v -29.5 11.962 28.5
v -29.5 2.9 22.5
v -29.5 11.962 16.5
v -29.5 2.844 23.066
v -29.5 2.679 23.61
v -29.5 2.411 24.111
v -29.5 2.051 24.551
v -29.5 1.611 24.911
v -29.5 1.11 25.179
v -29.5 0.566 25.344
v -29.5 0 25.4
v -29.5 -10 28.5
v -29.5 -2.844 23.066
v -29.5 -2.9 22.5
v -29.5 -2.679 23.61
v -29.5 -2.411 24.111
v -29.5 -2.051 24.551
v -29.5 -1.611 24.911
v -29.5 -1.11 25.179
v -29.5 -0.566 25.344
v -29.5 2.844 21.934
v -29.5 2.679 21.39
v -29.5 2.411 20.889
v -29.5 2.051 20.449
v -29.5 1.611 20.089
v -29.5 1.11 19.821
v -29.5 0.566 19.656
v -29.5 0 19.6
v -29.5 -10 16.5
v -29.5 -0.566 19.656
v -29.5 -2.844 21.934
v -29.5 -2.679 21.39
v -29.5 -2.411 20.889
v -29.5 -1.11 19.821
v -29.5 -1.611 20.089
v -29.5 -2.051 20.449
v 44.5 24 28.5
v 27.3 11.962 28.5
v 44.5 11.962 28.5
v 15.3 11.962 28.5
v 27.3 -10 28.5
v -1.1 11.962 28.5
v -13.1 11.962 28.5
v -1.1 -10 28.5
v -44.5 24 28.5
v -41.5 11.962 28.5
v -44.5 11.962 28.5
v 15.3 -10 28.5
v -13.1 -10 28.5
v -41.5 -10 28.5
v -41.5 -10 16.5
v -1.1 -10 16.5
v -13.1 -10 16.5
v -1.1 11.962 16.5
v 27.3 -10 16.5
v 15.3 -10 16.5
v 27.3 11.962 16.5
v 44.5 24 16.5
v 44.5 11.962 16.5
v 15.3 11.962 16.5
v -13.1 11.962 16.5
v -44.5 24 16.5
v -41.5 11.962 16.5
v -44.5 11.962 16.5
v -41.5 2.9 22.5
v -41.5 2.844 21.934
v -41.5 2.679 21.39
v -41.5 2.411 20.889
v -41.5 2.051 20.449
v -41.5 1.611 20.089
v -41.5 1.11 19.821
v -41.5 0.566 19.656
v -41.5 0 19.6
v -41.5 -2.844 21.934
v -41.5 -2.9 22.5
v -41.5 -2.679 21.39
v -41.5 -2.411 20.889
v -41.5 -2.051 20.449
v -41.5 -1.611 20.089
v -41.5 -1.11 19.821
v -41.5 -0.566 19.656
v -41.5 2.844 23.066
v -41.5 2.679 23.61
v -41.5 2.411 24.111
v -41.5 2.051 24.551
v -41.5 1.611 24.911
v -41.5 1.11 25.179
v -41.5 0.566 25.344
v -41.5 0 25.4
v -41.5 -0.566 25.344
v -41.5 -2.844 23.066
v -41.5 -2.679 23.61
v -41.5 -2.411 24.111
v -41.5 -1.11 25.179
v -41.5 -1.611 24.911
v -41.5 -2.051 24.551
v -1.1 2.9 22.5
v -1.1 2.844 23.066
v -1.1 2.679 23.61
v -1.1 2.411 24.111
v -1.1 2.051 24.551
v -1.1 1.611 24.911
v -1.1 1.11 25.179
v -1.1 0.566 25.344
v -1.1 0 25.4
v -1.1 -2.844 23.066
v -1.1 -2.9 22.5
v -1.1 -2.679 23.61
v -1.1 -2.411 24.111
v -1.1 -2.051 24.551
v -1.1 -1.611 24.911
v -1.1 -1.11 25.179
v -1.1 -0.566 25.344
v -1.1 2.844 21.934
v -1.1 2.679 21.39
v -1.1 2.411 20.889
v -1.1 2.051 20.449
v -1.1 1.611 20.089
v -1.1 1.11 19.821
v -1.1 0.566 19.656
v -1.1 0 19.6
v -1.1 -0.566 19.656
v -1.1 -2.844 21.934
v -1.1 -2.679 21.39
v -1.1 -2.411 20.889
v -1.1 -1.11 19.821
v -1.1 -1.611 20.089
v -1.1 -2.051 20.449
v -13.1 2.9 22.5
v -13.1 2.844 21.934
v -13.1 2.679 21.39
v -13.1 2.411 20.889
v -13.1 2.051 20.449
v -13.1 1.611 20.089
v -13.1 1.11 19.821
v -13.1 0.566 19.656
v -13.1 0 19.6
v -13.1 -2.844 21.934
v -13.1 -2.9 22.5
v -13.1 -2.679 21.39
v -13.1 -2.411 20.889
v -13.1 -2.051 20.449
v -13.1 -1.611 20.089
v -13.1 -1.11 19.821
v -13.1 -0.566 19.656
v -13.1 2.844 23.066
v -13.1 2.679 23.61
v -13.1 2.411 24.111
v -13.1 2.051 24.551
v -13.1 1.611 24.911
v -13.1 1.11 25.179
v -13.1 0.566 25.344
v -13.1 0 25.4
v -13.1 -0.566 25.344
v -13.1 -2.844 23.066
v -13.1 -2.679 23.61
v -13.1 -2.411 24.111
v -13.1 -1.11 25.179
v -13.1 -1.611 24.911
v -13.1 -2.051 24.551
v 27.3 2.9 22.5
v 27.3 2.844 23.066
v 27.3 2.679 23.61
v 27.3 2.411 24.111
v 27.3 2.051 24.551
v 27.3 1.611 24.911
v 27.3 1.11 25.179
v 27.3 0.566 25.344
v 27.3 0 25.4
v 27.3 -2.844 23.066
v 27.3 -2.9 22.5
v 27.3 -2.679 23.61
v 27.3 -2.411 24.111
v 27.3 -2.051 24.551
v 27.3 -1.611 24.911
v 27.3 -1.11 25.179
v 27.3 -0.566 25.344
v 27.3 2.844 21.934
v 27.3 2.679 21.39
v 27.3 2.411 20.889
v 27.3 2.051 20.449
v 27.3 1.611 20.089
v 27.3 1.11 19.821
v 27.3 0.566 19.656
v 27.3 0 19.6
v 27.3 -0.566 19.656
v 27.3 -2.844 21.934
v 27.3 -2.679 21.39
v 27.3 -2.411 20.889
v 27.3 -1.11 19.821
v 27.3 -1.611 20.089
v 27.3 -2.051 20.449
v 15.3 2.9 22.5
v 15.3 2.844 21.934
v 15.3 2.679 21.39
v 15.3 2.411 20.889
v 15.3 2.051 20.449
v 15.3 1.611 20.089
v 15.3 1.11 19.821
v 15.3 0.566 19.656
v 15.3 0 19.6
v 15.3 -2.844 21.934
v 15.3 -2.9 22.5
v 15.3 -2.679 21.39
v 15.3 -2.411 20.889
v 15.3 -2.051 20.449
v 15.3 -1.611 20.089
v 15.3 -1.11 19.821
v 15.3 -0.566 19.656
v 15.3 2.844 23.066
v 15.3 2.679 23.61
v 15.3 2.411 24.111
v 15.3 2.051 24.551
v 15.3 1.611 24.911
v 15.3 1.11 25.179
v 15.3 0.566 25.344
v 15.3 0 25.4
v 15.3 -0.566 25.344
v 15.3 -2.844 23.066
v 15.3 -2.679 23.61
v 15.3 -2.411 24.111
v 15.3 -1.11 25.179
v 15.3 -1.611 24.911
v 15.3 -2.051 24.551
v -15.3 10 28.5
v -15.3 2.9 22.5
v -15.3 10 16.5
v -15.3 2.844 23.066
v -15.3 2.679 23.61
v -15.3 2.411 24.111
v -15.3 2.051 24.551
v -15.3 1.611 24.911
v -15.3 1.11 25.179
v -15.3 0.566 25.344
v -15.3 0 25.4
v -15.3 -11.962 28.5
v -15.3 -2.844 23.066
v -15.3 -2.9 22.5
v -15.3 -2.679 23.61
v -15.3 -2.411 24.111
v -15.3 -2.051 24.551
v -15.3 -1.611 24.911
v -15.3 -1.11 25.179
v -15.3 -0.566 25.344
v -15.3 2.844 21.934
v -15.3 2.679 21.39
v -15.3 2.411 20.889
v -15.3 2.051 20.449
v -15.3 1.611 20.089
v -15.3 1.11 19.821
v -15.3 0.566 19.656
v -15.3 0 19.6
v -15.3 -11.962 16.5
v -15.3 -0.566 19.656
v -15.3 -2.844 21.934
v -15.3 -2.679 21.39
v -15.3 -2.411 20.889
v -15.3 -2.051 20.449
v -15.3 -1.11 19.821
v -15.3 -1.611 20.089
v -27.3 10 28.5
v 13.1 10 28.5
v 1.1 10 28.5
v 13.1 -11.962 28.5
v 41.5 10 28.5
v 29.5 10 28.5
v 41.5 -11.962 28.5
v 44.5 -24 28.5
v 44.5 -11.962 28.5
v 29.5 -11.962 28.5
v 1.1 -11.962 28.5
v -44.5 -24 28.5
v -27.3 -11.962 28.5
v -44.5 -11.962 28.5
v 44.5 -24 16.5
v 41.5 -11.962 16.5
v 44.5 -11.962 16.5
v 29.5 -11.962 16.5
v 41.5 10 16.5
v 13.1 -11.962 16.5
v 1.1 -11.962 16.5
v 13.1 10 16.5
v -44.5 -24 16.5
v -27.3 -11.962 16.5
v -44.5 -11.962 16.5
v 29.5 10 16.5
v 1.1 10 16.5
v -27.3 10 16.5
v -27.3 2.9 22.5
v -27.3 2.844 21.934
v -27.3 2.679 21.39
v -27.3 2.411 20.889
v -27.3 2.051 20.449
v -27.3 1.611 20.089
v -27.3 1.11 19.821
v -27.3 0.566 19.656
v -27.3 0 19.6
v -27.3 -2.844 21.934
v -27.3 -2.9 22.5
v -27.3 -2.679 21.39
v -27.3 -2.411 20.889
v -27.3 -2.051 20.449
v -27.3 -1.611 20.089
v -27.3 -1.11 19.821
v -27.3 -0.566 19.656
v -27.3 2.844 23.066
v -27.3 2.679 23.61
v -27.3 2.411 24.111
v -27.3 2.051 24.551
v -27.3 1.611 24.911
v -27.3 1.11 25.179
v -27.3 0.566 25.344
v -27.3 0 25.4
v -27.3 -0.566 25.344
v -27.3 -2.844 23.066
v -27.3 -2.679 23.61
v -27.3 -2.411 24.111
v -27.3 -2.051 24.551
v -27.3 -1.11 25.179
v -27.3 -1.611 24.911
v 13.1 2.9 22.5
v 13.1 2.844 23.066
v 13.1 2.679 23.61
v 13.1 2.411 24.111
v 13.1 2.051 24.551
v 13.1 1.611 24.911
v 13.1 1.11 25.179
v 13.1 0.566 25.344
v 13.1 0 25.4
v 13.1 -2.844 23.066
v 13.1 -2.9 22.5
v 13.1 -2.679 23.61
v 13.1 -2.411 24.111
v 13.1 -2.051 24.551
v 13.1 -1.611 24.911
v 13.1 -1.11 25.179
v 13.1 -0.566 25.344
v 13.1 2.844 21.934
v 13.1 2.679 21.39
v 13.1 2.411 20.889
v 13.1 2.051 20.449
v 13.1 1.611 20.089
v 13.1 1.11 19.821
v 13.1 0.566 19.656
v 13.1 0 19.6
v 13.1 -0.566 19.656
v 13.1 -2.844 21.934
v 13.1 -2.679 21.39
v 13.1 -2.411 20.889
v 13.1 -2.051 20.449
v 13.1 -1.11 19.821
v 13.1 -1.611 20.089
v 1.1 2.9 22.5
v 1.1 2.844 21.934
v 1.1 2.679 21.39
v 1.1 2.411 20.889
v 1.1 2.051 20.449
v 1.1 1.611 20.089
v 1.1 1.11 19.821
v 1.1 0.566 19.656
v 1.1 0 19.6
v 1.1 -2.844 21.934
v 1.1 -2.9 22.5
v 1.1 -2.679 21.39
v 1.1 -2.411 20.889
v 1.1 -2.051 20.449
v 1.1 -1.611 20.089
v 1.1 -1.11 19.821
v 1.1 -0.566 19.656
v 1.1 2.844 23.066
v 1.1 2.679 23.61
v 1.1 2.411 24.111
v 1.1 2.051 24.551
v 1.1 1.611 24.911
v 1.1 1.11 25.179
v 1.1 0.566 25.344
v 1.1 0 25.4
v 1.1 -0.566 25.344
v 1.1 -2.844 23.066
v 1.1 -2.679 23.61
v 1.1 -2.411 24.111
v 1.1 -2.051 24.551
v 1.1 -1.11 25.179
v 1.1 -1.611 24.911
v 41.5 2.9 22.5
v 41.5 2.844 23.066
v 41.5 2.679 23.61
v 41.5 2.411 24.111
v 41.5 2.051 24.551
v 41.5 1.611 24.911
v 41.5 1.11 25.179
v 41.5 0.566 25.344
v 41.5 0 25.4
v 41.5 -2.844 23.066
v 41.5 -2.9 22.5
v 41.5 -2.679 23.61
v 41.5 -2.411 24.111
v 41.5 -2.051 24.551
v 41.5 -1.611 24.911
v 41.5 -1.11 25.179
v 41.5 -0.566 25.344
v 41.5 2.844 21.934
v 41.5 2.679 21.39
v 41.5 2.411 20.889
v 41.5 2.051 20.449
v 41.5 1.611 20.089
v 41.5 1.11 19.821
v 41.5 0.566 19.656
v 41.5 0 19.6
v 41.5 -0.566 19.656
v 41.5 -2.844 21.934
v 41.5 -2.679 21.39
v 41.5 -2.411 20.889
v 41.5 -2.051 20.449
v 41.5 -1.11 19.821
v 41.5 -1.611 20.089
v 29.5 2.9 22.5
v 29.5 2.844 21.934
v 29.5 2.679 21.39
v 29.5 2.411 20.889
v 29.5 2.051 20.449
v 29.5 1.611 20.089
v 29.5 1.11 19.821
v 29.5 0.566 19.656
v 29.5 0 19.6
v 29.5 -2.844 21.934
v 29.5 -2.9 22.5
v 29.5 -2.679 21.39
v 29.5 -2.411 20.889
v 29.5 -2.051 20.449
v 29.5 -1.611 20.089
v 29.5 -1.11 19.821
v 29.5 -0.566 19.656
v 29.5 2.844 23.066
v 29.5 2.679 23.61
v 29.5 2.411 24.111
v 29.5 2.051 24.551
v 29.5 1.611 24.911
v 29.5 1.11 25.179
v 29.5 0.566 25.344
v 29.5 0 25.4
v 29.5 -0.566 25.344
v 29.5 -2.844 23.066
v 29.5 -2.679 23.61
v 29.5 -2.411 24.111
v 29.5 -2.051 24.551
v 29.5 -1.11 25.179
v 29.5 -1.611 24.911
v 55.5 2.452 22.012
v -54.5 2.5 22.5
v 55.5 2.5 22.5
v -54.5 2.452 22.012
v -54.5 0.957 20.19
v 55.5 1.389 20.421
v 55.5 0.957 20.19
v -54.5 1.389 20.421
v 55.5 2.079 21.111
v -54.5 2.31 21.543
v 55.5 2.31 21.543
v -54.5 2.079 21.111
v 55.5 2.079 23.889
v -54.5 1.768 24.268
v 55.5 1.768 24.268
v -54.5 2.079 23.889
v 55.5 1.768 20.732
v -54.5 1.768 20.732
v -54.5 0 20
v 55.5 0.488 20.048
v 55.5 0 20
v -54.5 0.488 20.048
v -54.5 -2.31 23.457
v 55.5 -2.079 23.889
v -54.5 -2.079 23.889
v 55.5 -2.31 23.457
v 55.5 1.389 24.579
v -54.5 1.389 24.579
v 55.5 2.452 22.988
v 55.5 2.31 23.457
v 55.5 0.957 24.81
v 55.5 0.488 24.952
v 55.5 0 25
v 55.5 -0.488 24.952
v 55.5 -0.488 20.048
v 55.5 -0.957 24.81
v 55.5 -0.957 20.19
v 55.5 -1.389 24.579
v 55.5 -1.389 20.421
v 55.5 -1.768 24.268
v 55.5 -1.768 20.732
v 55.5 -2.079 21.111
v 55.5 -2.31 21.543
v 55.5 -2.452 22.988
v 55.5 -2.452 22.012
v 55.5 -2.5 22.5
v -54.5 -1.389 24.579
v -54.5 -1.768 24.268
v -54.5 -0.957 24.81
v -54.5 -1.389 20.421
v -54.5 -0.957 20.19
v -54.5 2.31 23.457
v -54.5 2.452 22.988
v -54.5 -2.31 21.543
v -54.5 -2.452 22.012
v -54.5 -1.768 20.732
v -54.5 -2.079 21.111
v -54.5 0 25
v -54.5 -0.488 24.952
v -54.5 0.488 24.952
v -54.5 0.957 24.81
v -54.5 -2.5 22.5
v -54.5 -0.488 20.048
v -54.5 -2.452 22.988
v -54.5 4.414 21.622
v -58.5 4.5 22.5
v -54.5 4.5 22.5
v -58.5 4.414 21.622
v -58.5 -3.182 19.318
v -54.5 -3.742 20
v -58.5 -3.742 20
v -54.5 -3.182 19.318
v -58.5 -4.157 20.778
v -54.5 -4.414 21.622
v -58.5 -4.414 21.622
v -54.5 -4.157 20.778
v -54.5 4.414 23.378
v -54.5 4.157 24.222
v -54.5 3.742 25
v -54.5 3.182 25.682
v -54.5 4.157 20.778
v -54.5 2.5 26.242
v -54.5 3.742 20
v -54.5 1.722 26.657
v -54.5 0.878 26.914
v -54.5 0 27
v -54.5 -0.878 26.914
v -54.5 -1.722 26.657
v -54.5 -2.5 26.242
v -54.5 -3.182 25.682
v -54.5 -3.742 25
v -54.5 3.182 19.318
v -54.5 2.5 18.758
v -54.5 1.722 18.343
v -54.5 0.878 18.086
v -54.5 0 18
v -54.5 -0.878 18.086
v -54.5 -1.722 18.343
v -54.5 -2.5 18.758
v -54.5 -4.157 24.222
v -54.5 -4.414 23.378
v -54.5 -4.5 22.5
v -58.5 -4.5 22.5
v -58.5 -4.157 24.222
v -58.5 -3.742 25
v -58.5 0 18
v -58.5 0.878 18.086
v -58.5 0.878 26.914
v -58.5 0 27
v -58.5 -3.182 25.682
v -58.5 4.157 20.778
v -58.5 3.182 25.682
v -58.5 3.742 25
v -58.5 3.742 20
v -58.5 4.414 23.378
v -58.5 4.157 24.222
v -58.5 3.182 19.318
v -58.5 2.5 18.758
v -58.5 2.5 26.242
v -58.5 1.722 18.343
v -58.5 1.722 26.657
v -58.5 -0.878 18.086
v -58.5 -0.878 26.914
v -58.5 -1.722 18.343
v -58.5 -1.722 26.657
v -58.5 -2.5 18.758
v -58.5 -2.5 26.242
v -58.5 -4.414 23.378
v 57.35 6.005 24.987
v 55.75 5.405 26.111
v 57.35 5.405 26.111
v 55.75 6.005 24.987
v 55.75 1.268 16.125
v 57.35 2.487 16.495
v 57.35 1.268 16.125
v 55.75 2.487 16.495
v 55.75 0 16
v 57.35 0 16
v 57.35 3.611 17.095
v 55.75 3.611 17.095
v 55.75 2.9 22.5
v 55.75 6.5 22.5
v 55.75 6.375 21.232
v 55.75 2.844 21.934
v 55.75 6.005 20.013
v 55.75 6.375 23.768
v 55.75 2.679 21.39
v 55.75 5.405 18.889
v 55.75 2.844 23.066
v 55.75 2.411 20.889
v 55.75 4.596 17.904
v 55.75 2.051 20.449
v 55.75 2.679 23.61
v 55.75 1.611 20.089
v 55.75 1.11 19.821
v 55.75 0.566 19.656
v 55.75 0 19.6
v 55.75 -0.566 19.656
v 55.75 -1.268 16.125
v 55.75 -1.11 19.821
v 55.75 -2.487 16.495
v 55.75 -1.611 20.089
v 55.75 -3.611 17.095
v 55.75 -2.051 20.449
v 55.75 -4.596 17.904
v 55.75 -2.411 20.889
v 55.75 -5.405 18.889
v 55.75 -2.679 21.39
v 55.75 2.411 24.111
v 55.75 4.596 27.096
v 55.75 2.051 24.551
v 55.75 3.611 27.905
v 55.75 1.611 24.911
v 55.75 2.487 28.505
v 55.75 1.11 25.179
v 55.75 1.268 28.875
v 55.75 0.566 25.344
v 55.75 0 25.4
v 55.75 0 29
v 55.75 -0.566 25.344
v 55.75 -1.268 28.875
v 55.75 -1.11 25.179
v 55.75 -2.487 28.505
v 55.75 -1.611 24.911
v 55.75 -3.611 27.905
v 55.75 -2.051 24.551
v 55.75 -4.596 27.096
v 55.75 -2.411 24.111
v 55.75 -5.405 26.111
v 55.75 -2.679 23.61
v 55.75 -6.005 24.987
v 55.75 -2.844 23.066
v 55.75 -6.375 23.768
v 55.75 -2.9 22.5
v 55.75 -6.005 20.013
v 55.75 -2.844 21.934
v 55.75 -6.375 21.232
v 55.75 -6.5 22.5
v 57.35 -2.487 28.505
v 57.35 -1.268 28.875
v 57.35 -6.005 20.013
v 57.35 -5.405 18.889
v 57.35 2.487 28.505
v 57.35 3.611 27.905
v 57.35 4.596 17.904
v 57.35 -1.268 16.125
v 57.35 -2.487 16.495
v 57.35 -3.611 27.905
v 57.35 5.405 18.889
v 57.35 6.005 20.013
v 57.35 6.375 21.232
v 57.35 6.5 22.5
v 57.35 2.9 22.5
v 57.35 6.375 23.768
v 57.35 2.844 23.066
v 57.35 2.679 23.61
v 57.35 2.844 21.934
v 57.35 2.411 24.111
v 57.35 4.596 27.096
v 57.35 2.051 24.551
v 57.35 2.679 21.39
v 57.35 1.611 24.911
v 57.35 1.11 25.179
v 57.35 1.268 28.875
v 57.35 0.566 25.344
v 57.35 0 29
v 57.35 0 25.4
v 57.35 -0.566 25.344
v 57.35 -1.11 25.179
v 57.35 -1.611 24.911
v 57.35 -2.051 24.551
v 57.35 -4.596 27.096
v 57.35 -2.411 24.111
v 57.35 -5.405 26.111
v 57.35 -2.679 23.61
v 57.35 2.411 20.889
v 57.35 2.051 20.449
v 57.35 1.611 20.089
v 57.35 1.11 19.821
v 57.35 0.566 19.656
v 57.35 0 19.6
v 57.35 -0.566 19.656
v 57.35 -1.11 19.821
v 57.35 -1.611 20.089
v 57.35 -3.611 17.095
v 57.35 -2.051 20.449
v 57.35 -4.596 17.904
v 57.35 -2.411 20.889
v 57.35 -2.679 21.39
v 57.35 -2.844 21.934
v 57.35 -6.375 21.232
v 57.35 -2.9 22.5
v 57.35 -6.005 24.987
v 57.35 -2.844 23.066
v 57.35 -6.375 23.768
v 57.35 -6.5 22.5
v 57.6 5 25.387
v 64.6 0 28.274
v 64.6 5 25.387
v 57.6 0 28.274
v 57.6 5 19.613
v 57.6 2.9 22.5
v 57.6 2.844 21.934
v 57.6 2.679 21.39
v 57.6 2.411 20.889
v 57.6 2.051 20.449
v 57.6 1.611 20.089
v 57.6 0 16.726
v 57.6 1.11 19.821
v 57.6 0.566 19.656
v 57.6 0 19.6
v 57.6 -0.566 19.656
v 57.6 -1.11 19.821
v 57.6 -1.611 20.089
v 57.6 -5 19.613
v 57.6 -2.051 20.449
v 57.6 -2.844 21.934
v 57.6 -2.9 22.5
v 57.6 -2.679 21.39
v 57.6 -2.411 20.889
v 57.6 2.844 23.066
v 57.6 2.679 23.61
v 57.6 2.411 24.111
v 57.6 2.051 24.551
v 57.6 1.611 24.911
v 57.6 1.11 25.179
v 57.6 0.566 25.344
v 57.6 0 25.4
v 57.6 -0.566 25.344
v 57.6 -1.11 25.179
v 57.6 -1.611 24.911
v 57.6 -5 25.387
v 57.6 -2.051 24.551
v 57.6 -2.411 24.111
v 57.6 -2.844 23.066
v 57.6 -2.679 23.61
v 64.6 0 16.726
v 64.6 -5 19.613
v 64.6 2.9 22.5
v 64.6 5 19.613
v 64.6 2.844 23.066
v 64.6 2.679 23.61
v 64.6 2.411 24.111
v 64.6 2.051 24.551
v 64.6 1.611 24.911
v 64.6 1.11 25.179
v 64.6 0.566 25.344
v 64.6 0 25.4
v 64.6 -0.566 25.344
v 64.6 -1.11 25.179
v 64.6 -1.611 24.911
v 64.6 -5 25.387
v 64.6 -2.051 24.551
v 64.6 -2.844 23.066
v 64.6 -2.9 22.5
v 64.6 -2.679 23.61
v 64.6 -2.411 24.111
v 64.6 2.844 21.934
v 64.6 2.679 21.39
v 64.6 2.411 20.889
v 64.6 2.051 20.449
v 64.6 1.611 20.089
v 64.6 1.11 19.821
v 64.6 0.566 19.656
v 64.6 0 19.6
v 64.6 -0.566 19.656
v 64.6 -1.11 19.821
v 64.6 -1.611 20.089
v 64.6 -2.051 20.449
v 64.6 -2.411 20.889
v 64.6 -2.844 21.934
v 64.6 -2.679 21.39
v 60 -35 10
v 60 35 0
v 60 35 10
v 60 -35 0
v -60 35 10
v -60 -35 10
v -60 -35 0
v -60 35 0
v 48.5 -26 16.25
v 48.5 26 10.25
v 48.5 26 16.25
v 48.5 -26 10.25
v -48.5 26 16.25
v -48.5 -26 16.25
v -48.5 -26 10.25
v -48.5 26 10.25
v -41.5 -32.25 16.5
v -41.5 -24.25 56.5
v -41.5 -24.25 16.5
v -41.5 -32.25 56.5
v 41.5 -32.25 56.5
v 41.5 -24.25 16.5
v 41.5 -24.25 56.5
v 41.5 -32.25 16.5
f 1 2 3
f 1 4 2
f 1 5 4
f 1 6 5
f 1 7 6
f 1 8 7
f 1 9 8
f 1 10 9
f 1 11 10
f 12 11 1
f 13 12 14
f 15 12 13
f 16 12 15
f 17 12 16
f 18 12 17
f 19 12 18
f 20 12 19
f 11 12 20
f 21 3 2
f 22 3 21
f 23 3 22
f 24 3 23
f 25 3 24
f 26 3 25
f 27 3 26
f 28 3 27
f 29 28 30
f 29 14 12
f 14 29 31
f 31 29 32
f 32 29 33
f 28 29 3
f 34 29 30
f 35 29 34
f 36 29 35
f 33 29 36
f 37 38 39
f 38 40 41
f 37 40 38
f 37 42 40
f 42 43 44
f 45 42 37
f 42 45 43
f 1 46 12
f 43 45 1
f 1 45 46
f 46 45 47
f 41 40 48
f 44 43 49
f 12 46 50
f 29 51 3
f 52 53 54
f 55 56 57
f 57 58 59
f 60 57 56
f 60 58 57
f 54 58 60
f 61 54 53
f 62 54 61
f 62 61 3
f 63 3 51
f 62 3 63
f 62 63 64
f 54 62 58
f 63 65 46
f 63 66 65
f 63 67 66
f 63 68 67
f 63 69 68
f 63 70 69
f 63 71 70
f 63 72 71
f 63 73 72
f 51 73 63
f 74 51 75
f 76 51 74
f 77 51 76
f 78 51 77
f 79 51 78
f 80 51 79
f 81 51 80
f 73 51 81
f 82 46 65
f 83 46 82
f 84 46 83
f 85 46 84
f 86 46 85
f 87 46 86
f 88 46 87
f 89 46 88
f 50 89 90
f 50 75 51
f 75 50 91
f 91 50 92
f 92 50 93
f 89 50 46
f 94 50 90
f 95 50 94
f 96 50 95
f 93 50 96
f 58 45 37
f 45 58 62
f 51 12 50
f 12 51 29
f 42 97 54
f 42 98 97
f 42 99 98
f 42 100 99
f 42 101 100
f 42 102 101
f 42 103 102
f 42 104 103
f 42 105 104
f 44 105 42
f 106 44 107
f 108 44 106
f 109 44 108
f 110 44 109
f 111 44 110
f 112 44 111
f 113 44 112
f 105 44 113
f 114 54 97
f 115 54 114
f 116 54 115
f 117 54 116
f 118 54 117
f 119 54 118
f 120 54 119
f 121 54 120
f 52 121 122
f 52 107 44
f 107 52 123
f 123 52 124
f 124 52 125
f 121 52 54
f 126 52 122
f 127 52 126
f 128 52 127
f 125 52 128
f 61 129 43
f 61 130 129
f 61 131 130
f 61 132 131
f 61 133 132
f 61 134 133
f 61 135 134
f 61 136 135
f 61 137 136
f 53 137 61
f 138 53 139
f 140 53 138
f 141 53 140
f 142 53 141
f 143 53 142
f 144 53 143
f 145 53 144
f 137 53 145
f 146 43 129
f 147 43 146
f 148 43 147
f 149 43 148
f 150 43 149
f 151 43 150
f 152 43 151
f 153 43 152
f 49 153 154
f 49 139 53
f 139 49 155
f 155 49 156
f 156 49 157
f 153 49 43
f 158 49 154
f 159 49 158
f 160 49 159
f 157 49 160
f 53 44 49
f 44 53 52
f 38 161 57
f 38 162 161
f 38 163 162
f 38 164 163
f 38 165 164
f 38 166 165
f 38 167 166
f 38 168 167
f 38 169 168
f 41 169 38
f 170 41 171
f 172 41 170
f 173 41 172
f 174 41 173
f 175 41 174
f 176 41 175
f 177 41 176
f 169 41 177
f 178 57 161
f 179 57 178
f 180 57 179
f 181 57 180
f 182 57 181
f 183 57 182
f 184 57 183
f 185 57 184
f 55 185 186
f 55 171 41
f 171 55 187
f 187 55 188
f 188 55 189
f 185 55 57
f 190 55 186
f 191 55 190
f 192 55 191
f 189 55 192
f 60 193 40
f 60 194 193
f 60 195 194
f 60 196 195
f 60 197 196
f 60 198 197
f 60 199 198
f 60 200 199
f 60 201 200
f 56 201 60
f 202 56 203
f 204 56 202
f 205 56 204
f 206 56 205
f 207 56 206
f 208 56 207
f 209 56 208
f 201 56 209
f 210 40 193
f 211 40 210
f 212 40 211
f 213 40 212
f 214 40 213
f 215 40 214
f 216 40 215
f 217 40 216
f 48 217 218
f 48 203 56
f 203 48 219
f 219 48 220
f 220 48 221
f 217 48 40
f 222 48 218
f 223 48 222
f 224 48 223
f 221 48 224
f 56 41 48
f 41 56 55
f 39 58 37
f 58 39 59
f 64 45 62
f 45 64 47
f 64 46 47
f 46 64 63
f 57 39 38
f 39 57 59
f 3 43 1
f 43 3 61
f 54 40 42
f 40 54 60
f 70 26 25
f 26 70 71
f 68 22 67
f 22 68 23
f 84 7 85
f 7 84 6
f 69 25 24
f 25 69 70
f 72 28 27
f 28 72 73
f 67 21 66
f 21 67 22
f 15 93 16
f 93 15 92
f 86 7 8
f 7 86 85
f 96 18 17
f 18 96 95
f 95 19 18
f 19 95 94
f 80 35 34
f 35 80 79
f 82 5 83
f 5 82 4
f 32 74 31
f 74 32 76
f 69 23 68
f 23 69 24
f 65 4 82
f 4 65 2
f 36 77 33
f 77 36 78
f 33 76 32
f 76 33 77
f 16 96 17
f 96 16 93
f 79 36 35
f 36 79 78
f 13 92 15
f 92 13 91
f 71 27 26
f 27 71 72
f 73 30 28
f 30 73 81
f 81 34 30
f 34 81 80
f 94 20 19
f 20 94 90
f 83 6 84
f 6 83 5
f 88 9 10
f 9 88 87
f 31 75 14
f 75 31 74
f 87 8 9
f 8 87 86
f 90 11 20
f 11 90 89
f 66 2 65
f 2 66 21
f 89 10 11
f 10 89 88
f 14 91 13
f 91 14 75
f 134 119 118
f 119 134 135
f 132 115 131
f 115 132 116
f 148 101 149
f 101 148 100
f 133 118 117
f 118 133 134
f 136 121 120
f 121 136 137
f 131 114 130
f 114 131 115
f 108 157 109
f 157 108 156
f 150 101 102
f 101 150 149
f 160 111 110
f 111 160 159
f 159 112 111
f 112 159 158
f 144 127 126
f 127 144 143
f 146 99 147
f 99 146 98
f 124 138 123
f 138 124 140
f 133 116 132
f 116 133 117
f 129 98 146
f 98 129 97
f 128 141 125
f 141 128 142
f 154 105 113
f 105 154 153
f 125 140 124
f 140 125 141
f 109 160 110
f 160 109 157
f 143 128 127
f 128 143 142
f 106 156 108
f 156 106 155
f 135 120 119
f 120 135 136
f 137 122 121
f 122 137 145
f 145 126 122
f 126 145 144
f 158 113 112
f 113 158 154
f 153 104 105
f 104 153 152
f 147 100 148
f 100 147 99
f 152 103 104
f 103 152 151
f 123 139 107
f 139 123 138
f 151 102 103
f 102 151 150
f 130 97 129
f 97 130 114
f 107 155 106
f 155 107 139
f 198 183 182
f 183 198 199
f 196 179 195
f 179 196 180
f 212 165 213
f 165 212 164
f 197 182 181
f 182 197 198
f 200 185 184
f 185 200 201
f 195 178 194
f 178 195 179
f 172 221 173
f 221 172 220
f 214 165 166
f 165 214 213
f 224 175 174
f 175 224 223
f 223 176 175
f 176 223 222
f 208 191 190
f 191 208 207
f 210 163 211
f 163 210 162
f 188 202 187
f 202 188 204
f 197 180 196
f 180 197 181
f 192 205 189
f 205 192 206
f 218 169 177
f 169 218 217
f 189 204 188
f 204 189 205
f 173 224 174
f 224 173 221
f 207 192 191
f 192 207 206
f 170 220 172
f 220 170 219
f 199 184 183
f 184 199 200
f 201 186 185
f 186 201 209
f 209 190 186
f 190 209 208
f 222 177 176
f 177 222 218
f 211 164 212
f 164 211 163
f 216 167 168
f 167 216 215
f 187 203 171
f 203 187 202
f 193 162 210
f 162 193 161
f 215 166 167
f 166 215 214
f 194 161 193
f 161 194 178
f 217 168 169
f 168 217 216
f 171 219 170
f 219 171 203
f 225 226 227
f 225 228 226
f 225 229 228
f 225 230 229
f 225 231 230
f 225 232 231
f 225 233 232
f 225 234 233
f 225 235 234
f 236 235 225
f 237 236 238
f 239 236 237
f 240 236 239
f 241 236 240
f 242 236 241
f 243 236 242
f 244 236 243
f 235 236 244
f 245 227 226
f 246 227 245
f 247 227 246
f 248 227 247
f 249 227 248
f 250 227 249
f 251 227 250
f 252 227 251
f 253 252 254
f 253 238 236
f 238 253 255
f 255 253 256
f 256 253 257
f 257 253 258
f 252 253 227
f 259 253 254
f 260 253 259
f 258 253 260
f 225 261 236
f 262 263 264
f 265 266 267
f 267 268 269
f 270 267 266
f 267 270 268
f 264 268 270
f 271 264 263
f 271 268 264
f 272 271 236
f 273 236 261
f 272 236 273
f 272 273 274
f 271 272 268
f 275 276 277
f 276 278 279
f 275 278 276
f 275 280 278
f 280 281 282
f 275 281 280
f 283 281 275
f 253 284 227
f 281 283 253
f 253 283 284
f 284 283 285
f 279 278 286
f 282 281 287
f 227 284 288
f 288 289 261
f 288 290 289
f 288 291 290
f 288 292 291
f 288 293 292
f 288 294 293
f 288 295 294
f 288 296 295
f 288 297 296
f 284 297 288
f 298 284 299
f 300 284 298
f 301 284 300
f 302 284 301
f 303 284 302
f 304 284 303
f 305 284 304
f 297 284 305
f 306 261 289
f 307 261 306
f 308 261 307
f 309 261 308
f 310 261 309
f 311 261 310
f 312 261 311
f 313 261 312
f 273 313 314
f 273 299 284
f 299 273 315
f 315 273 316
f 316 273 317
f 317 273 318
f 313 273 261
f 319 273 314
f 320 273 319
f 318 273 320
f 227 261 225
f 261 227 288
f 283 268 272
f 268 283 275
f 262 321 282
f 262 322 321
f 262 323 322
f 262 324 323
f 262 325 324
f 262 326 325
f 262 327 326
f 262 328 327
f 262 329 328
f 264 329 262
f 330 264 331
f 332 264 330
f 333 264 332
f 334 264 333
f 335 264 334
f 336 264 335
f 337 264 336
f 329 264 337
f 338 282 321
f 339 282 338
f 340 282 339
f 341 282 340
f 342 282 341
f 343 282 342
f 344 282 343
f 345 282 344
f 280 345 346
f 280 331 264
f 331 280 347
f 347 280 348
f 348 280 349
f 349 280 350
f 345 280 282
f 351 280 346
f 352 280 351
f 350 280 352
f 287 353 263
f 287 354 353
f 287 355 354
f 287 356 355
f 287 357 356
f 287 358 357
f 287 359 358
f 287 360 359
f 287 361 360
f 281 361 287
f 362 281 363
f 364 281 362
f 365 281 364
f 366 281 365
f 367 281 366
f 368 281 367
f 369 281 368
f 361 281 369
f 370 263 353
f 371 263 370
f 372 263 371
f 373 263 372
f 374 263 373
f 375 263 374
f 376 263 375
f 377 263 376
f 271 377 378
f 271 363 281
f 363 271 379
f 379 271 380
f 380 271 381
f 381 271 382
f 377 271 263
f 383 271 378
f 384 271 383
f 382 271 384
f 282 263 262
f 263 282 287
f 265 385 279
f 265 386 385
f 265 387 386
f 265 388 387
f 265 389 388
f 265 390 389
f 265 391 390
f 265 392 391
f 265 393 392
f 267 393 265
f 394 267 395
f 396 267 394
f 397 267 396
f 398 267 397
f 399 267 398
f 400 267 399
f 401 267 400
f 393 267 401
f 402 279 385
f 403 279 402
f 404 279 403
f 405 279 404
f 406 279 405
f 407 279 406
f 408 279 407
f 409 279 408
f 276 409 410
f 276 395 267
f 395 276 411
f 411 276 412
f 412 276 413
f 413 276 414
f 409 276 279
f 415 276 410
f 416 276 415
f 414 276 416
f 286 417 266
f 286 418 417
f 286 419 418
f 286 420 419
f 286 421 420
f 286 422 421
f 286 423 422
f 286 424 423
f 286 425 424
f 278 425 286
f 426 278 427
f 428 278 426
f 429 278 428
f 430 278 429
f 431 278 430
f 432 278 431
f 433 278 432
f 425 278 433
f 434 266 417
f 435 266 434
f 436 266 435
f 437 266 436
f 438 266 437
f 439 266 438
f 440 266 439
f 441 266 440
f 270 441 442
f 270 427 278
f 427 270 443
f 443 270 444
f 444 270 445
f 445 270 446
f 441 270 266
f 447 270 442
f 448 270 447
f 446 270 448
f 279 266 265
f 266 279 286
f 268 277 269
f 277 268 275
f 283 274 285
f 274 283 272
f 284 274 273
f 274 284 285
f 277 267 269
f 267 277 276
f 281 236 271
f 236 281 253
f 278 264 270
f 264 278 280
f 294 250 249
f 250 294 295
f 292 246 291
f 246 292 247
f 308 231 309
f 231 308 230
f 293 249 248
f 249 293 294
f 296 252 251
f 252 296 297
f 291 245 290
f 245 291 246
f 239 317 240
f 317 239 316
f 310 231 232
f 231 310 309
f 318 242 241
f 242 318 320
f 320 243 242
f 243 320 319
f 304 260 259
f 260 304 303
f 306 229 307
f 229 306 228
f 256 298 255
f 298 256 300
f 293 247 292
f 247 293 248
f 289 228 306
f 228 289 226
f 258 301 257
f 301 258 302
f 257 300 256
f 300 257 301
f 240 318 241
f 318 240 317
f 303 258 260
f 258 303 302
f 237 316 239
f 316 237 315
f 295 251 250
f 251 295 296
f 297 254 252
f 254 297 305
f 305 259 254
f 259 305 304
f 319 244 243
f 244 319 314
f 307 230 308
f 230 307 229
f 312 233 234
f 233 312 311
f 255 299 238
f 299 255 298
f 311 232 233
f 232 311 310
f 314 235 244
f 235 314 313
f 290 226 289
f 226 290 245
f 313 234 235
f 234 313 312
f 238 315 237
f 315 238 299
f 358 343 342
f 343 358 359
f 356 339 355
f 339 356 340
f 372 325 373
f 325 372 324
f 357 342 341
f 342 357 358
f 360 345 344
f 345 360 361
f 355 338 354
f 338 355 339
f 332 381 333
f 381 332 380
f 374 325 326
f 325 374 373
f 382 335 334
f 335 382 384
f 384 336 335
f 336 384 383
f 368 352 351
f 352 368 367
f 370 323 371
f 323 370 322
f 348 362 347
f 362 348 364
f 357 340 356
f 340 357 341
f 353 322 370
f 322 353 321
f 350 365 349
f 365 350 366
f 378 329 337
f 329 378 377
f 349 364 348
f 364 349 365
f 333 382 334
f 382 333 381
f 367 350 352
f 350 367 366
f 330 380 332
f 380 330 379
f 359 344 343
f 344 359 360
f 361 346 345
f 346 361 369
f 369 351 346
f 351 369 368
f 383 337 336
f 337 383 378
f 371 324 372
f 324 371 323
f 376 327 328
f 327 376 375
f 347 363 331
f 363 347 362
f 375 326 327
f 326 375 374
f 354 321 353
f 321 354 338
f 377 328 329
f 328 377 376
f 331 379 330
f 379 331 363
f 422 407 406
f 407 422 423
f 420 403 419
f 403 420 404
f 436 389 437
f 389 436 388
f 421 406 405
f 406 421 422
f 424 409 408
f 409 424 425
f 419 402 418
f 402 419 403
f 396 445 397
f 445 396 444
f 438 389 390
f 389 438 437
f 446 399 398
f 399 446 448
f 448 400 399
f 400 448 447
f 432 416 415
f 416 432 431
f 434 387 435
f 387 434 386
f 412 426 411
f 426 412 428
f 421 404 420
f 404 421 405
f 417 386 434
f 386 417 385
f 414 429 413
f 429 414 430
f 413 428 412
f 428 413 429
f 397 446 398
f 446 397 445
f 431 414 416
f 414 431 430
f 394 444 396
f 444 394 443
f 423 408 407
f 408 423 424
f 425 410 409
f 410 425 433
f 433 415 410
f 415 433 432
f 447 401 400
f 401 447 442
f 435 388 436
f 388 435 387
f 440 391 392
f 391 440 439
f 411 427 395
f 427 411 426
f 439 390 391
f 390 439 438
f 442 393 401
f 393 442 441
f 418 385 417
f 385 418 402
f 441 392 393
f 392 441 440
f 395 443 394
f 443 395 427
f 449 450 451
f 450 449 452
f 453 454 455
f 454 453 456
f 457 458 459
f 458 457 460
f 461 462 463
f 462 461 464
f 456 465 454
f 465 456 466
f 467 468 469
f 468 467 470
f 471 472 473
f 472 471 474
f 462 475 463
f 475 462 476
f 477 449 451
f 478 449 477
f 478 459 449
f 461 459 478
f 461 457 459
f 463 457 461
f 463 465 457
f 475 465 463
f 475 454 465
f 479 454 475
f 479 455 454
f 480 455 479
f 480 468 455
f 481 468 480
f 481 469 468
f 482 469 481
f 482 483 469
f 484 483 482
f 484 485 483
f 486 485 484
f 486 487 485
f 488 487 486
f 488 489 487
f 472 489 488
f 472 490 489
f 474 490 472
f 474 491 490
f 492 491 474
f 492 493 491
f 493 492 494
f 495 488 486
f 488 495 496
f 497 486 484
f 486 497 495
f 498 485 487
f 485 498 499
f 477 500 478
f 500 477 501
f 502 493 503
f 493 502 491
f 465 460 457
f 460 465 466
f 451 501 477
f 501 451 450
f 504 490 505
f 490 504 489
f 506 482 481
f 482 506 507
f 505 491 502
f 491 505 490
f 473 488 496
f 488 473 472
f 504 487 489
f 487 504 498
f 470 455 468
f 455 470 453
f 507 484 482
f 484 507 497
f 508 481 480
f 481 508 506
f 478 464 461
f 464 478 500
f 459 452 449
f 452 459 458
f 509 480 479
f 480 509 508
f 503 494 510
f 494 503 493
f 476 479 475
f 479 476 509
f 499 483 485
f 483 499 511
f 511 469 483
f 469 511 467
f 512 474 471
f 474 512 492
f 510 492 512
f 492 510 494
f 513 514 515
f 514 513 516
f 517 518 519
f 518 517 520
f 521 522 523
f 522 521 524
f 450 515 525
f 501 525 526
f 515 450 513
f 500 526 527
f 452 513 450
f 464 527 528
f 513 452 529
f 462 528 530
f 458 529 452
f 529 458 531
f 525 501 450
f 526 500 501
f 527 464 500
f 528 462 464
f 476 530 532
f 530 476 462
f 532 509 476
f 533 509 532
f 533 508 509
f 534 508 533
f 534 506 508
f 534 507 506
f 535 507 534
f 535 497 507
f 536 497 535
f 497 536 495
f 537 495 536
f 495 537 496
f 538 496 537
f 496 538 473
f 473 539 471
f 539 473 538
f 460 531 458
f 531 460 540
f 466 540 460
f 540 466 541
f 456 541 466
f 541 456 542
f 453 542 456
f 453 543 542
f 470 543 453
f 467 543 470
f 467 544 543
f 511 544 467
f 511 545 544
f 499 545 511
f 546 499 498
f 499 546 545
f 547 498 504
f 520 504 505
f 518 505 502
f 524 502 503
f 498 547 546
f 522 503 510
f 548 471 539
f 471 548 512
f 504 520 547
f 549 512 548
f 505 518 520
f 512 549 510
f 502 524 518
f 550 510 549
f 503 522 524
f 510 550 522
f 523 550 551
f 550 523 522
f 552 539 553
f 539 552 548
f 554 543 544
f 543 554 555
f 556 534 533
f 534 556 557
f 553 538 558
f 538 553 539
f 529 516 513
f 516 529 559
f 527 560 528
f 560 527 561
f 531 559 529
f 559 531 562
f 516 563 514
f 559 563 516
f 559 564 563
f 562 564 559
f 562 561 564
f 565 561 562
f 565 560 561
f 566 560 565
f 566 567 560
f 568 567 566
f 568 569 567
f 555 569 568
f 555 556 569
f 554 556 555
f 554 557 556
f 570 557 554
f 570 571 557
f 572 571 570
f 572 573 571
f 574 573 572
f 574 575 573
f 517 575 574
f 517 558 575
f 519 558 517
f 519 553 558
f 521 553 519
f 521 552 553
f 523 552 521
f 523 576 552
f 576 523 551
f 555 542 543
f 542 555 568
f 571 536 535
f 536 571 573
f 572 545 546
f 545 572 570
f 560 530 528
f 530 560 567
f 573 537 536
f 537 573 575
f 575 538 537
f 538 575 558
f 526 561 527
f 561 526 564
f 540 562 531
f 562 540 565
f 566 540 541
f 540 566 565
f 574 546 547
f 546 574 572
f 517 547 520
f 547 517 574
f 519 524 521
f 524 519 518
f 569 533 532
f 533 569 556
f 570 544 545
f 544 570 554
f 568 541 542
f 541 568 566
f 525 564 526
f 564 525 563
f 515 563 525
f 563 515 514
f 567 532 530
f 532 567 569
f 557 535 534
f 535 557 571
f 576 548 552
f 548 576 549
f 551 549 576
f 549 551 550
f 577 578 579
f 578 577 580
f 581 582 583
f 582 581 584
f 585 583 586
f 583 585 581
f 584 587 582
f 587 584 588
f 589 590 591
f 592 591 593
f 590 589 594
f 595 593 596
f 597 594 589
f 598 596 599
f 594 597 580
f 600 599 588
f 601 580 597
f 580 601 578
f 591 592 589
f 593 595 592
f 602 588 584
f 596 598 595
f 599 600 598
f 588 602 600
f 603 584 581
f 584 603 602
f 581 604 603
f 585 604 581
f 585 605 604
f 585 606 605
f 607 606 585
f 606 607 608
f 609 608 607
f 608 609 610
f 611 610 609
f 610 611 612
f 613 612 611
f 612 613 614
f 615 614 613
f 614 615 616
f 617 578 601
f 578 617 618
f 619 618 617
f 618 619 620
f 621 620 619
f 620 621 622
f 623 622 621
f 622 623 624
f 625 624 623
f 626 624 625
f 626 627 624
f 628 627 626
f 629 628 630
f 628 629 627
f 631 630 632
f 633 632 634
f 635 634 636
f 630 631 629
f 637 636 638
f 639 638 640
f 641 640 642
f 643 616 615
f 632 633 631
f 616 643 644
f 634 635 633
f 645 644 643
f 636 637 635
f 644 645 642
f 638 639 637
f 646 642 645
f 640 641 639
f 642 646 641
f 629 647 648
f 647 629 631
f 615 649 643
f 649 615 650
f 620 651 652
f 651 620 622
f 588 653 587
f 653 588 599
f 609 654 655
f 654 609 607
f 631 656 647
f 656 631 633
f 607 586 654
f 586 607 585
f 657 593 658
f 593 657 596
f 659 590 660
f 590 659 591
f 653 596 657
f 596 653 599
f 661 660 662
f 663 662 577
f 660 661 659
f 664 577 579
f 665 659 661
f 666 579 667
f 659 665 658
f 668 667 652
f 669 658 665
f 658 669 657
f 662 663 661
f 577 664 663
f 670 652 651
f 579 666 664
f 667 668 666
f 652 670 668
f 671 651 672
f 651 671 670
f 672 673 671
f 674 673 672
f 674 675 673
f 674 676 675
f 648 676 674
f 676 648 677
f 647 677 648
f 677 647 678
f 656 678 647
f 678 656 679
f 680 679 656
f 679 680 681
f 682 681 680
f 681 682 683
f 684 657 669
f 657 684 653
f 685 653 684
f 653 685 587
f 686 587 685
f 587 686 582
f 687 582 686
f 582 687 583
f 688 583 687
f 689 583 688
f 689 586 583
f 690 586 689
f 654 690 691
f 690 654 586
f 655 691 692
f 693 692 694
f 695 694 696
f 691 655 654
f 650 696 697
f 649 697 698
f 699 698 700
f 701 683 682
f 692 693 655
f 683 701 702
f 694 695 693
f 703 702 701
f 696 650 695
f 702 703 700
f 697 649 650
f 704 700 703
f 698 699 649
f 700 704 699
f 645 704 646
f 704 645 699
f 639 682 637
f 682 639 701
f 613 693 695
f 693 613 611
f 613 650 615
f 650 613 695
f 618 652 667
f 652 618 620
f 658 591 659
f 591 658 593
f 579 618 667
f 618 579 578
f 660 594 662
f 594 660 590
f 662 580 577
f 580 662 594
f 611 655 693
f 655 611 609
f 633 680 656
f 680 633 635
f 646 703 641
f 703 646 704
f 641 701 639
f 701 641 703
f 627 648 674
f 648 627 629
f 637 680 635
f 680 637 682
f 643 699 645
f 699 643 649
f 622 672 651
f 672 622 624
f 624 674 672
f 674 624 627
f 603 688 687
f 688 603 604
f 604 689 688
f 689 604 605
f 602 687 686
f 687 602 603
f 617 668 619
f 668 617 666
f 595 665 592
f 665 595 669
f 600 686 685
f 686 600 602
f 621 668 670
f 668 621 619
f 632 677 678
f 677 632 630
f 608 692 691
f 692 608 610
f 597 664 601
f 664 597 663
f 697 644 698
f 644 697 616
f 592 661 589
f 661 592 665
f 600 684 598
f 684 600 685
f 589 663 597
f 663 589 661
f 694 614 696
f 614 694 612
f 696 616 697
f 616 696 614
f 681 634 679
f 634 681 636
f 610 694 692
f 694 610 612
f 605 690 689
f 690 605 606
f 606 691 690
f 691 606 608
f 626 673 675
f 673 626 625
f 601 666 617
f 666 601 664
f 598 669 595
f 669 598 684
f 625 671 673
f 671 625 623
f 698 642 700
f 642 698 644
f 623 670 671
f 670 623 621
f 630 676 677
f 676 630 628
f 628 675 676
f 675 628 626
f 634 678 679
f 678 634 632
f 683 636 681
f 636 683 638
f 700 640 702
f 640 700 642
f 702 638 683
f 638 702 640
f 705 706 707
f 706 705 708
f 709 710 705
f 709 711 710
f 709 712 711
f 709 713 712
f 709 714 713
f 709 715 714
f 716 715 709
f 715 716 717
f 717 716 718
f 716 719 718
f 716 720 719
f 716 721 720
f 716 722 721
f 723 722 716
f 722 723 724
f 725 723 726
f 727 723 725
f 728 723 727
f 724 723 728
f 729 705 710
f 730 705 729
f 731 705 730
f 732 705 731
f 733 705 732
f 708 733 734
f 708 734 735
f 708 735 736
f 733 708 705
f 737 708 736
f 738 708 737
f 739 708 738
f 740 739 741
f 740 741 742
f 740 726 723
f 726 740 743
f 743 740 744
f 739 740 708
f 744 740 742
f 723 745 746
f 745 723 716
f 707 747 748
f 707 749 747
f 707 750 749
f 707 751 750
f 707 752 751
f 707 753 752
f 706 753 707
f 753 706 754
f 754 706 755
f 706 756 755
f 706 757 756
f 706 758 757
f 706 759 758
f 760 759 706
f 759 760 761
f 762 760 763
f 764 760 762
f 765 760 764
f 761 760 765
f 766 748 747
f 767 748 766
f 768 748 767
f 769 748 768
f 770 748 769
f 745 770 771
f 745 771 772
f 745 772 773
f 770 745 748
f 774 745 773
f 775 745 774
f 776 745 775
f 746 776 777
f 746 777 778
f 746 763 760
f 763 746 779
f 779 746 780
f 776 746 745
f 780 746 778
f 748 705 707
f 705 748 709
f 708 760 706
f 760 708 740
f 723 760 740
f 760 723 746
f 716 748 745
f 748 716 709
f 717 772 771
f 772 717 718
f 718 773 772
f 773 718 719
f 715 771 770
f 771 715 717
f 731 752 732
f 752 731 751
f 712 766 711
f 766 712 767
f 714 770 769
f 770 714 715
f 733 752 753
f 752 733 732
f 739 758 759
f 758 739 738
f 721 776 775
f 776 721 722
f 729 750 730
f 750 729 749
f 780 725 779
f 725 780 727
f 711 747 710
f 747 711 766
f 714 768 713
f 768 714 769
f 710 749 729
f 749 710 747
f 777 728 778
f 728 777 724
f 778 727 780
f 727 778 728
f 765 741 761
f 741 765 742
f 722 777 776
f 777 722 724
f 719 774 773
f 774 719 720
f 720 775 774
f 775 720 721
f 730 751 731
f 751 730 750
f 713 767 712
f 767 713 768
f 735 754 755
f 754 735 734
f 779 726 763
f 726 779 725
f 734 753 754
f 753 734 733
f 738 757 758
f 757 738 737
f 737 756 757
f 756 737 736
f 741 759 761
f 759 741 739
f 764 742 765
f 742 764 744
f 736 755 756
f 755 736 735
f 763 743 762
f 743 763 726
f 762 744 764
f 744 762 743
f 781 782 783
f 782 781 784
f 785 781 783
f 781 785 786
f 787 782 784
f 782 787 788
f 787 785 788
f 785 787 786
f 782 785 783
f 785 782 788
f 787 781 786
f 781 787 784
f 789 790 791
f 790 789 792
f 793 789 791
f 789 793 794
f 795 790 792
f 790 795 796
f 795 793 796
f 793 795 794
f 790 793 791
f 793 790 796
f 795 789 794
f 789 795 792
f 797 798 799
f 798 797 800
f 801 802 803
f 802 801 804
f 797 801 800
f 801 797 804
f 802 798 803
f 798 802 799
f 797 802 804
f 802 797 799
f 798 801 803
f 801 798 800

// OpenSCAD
$fn = 32;

// ------------------------------------------------------------------------
// Comb hinge with flap: leaf 89 x 24 mm, pin d5, flap 40 mm
// Every part is its own module, assembly() places every instance.
// ------------------------------------------------------------------------

// --- part 1 ---
module hinge_bed() {
  difference() {
    translate([-60, -35, 0]) cube([120, 70, 10]);
  }
}

// --- part 2 ---
module hinge_riser() {
  difference() {
    translate([-48.5, -26, 0]) cube([97, 52, 6]);
  }
}

// --- part 3 ---
module hinge_leaf_a() {
  difference() {
    union() {
      translate([-41.5, -10, -6]) cube([12, 34, 12]);
      translate([-13.1, -10, -6]) cube([12, 34, 12]);
      translate([15.3, -10, -6]) cube([12, 34, 12]);
      translate([-44.5, 11.962, -6]) cube([89, 12.038, 12]);
    }
    translate([-35.5, 0, 0]) rotate([0, 90, 0]) cylinder(h = 14, d = 5.8, center = true);
    translate([-7.1, 0, 0]) rotate([0, 90, 0]) cylinder(h = 14, d = 5.8, center = true);
    translate([21.3, 0, 0]) rotate([0, 90, 0]) cylinder(h = 14, d = 5.8, center = true);
  }
}

// --- part 4 ---
module hinge_leaf_b() {
  difference() {
    union() {
      translate([-27.3, -24, -6]) cube([12, 34, 12]);
      translate([1.1, -24, -6]) cube([12, 34, 12]);
      translate([29.5, -24, -6]) cube([12, 34, 12]);
      translate([-44.5, -24, -6]) cube([89, 12.038, 12]);
    }
    translate([-21.3, 0, 0]) rotate([0, 90, 0]) cylinder(h = 14, d = 5.8, center = true);
    translate([7.1, 0, 0]) rotate([0, 90, 0]) cylinder(h = 14, d = 5.8, center = true);
    translate([35.5, 0, 0]) rotate([0, 90, 0]) cylinder(h = 14, d = 5.8, center = true);
  }
}

// --- part 5 ---
module hinge_flap() {
  difference() {
    translate([-41.5, -20, 0]) cube([83, 40, 8]);
  }
}

// --- part 6 ---
module hinge_pin() {
  rotate([0, 90, 0]) cylinder(h = 111, d = 5, center = true);
  translate([-58.5, 0, 0]) rotate([0, 90, 0]) cylinder(h = 4, d = 9);
}

// --- part 7 ---
module pin_washer() {
  difference() {
      translate([0, 0, 0]) cylinder(h = 1.6, d = 13);
      translate([0, 0, -1]) cylinder(h = 3.6, d = 5.8);
    }
}

// --- part 8 ---
module pin_nut() {
  difference() {
    linear_extrude(height = 7) polygon(points = [[5.774, 0], [2.887, 5], [-2.887, 5], [-5.774, 0], [-2.887, -5], [2.887, -5]]);
    translate([0, 0, -1]) cylinder(h = 9, d = 5.8);
  }
}

// --- assembly ---
module assembly() {
  color([0.80, 0.24, 0.20]) translate([0, 0, 0]) rotate([0, 0, 0]) hinge_bed();
  color([0.20, 0.45, 0.75]) translate([0, 0, 10.25]) rotate([0, 0, 0]) hinge_riser();
  color([0.25, 0.62, 0.32]) translate([0, 0, 22.5]) rotate([0, 0, 0]) hinge_leaf_a();
  color([0.92, 0.70, 0.18]) translate([0, 0, 22.5]) rotate([0, 0, 0]) hinge_leaf_b();
  color([0.58, 0.35, 0.70]) translate([0, -24.25, 36.5]) rotate([90, 0, 0]) hinge_flap();
  color([0.16, 0.66, 0.66]) translate([0, 0, 22.5]) rotate([0, 0, 0]) hinge_pin();
  color([0.85, 0.48, 0.18]) translate([55.75, 0, 22.5]) rotate([0, 90, 0]) pin_washer();
  color([0.55, 0.60, 0.65]) translate([57.6, 0, 22.5]) rotate([0, 90, 0]) pin_nut();
}

assembly();
